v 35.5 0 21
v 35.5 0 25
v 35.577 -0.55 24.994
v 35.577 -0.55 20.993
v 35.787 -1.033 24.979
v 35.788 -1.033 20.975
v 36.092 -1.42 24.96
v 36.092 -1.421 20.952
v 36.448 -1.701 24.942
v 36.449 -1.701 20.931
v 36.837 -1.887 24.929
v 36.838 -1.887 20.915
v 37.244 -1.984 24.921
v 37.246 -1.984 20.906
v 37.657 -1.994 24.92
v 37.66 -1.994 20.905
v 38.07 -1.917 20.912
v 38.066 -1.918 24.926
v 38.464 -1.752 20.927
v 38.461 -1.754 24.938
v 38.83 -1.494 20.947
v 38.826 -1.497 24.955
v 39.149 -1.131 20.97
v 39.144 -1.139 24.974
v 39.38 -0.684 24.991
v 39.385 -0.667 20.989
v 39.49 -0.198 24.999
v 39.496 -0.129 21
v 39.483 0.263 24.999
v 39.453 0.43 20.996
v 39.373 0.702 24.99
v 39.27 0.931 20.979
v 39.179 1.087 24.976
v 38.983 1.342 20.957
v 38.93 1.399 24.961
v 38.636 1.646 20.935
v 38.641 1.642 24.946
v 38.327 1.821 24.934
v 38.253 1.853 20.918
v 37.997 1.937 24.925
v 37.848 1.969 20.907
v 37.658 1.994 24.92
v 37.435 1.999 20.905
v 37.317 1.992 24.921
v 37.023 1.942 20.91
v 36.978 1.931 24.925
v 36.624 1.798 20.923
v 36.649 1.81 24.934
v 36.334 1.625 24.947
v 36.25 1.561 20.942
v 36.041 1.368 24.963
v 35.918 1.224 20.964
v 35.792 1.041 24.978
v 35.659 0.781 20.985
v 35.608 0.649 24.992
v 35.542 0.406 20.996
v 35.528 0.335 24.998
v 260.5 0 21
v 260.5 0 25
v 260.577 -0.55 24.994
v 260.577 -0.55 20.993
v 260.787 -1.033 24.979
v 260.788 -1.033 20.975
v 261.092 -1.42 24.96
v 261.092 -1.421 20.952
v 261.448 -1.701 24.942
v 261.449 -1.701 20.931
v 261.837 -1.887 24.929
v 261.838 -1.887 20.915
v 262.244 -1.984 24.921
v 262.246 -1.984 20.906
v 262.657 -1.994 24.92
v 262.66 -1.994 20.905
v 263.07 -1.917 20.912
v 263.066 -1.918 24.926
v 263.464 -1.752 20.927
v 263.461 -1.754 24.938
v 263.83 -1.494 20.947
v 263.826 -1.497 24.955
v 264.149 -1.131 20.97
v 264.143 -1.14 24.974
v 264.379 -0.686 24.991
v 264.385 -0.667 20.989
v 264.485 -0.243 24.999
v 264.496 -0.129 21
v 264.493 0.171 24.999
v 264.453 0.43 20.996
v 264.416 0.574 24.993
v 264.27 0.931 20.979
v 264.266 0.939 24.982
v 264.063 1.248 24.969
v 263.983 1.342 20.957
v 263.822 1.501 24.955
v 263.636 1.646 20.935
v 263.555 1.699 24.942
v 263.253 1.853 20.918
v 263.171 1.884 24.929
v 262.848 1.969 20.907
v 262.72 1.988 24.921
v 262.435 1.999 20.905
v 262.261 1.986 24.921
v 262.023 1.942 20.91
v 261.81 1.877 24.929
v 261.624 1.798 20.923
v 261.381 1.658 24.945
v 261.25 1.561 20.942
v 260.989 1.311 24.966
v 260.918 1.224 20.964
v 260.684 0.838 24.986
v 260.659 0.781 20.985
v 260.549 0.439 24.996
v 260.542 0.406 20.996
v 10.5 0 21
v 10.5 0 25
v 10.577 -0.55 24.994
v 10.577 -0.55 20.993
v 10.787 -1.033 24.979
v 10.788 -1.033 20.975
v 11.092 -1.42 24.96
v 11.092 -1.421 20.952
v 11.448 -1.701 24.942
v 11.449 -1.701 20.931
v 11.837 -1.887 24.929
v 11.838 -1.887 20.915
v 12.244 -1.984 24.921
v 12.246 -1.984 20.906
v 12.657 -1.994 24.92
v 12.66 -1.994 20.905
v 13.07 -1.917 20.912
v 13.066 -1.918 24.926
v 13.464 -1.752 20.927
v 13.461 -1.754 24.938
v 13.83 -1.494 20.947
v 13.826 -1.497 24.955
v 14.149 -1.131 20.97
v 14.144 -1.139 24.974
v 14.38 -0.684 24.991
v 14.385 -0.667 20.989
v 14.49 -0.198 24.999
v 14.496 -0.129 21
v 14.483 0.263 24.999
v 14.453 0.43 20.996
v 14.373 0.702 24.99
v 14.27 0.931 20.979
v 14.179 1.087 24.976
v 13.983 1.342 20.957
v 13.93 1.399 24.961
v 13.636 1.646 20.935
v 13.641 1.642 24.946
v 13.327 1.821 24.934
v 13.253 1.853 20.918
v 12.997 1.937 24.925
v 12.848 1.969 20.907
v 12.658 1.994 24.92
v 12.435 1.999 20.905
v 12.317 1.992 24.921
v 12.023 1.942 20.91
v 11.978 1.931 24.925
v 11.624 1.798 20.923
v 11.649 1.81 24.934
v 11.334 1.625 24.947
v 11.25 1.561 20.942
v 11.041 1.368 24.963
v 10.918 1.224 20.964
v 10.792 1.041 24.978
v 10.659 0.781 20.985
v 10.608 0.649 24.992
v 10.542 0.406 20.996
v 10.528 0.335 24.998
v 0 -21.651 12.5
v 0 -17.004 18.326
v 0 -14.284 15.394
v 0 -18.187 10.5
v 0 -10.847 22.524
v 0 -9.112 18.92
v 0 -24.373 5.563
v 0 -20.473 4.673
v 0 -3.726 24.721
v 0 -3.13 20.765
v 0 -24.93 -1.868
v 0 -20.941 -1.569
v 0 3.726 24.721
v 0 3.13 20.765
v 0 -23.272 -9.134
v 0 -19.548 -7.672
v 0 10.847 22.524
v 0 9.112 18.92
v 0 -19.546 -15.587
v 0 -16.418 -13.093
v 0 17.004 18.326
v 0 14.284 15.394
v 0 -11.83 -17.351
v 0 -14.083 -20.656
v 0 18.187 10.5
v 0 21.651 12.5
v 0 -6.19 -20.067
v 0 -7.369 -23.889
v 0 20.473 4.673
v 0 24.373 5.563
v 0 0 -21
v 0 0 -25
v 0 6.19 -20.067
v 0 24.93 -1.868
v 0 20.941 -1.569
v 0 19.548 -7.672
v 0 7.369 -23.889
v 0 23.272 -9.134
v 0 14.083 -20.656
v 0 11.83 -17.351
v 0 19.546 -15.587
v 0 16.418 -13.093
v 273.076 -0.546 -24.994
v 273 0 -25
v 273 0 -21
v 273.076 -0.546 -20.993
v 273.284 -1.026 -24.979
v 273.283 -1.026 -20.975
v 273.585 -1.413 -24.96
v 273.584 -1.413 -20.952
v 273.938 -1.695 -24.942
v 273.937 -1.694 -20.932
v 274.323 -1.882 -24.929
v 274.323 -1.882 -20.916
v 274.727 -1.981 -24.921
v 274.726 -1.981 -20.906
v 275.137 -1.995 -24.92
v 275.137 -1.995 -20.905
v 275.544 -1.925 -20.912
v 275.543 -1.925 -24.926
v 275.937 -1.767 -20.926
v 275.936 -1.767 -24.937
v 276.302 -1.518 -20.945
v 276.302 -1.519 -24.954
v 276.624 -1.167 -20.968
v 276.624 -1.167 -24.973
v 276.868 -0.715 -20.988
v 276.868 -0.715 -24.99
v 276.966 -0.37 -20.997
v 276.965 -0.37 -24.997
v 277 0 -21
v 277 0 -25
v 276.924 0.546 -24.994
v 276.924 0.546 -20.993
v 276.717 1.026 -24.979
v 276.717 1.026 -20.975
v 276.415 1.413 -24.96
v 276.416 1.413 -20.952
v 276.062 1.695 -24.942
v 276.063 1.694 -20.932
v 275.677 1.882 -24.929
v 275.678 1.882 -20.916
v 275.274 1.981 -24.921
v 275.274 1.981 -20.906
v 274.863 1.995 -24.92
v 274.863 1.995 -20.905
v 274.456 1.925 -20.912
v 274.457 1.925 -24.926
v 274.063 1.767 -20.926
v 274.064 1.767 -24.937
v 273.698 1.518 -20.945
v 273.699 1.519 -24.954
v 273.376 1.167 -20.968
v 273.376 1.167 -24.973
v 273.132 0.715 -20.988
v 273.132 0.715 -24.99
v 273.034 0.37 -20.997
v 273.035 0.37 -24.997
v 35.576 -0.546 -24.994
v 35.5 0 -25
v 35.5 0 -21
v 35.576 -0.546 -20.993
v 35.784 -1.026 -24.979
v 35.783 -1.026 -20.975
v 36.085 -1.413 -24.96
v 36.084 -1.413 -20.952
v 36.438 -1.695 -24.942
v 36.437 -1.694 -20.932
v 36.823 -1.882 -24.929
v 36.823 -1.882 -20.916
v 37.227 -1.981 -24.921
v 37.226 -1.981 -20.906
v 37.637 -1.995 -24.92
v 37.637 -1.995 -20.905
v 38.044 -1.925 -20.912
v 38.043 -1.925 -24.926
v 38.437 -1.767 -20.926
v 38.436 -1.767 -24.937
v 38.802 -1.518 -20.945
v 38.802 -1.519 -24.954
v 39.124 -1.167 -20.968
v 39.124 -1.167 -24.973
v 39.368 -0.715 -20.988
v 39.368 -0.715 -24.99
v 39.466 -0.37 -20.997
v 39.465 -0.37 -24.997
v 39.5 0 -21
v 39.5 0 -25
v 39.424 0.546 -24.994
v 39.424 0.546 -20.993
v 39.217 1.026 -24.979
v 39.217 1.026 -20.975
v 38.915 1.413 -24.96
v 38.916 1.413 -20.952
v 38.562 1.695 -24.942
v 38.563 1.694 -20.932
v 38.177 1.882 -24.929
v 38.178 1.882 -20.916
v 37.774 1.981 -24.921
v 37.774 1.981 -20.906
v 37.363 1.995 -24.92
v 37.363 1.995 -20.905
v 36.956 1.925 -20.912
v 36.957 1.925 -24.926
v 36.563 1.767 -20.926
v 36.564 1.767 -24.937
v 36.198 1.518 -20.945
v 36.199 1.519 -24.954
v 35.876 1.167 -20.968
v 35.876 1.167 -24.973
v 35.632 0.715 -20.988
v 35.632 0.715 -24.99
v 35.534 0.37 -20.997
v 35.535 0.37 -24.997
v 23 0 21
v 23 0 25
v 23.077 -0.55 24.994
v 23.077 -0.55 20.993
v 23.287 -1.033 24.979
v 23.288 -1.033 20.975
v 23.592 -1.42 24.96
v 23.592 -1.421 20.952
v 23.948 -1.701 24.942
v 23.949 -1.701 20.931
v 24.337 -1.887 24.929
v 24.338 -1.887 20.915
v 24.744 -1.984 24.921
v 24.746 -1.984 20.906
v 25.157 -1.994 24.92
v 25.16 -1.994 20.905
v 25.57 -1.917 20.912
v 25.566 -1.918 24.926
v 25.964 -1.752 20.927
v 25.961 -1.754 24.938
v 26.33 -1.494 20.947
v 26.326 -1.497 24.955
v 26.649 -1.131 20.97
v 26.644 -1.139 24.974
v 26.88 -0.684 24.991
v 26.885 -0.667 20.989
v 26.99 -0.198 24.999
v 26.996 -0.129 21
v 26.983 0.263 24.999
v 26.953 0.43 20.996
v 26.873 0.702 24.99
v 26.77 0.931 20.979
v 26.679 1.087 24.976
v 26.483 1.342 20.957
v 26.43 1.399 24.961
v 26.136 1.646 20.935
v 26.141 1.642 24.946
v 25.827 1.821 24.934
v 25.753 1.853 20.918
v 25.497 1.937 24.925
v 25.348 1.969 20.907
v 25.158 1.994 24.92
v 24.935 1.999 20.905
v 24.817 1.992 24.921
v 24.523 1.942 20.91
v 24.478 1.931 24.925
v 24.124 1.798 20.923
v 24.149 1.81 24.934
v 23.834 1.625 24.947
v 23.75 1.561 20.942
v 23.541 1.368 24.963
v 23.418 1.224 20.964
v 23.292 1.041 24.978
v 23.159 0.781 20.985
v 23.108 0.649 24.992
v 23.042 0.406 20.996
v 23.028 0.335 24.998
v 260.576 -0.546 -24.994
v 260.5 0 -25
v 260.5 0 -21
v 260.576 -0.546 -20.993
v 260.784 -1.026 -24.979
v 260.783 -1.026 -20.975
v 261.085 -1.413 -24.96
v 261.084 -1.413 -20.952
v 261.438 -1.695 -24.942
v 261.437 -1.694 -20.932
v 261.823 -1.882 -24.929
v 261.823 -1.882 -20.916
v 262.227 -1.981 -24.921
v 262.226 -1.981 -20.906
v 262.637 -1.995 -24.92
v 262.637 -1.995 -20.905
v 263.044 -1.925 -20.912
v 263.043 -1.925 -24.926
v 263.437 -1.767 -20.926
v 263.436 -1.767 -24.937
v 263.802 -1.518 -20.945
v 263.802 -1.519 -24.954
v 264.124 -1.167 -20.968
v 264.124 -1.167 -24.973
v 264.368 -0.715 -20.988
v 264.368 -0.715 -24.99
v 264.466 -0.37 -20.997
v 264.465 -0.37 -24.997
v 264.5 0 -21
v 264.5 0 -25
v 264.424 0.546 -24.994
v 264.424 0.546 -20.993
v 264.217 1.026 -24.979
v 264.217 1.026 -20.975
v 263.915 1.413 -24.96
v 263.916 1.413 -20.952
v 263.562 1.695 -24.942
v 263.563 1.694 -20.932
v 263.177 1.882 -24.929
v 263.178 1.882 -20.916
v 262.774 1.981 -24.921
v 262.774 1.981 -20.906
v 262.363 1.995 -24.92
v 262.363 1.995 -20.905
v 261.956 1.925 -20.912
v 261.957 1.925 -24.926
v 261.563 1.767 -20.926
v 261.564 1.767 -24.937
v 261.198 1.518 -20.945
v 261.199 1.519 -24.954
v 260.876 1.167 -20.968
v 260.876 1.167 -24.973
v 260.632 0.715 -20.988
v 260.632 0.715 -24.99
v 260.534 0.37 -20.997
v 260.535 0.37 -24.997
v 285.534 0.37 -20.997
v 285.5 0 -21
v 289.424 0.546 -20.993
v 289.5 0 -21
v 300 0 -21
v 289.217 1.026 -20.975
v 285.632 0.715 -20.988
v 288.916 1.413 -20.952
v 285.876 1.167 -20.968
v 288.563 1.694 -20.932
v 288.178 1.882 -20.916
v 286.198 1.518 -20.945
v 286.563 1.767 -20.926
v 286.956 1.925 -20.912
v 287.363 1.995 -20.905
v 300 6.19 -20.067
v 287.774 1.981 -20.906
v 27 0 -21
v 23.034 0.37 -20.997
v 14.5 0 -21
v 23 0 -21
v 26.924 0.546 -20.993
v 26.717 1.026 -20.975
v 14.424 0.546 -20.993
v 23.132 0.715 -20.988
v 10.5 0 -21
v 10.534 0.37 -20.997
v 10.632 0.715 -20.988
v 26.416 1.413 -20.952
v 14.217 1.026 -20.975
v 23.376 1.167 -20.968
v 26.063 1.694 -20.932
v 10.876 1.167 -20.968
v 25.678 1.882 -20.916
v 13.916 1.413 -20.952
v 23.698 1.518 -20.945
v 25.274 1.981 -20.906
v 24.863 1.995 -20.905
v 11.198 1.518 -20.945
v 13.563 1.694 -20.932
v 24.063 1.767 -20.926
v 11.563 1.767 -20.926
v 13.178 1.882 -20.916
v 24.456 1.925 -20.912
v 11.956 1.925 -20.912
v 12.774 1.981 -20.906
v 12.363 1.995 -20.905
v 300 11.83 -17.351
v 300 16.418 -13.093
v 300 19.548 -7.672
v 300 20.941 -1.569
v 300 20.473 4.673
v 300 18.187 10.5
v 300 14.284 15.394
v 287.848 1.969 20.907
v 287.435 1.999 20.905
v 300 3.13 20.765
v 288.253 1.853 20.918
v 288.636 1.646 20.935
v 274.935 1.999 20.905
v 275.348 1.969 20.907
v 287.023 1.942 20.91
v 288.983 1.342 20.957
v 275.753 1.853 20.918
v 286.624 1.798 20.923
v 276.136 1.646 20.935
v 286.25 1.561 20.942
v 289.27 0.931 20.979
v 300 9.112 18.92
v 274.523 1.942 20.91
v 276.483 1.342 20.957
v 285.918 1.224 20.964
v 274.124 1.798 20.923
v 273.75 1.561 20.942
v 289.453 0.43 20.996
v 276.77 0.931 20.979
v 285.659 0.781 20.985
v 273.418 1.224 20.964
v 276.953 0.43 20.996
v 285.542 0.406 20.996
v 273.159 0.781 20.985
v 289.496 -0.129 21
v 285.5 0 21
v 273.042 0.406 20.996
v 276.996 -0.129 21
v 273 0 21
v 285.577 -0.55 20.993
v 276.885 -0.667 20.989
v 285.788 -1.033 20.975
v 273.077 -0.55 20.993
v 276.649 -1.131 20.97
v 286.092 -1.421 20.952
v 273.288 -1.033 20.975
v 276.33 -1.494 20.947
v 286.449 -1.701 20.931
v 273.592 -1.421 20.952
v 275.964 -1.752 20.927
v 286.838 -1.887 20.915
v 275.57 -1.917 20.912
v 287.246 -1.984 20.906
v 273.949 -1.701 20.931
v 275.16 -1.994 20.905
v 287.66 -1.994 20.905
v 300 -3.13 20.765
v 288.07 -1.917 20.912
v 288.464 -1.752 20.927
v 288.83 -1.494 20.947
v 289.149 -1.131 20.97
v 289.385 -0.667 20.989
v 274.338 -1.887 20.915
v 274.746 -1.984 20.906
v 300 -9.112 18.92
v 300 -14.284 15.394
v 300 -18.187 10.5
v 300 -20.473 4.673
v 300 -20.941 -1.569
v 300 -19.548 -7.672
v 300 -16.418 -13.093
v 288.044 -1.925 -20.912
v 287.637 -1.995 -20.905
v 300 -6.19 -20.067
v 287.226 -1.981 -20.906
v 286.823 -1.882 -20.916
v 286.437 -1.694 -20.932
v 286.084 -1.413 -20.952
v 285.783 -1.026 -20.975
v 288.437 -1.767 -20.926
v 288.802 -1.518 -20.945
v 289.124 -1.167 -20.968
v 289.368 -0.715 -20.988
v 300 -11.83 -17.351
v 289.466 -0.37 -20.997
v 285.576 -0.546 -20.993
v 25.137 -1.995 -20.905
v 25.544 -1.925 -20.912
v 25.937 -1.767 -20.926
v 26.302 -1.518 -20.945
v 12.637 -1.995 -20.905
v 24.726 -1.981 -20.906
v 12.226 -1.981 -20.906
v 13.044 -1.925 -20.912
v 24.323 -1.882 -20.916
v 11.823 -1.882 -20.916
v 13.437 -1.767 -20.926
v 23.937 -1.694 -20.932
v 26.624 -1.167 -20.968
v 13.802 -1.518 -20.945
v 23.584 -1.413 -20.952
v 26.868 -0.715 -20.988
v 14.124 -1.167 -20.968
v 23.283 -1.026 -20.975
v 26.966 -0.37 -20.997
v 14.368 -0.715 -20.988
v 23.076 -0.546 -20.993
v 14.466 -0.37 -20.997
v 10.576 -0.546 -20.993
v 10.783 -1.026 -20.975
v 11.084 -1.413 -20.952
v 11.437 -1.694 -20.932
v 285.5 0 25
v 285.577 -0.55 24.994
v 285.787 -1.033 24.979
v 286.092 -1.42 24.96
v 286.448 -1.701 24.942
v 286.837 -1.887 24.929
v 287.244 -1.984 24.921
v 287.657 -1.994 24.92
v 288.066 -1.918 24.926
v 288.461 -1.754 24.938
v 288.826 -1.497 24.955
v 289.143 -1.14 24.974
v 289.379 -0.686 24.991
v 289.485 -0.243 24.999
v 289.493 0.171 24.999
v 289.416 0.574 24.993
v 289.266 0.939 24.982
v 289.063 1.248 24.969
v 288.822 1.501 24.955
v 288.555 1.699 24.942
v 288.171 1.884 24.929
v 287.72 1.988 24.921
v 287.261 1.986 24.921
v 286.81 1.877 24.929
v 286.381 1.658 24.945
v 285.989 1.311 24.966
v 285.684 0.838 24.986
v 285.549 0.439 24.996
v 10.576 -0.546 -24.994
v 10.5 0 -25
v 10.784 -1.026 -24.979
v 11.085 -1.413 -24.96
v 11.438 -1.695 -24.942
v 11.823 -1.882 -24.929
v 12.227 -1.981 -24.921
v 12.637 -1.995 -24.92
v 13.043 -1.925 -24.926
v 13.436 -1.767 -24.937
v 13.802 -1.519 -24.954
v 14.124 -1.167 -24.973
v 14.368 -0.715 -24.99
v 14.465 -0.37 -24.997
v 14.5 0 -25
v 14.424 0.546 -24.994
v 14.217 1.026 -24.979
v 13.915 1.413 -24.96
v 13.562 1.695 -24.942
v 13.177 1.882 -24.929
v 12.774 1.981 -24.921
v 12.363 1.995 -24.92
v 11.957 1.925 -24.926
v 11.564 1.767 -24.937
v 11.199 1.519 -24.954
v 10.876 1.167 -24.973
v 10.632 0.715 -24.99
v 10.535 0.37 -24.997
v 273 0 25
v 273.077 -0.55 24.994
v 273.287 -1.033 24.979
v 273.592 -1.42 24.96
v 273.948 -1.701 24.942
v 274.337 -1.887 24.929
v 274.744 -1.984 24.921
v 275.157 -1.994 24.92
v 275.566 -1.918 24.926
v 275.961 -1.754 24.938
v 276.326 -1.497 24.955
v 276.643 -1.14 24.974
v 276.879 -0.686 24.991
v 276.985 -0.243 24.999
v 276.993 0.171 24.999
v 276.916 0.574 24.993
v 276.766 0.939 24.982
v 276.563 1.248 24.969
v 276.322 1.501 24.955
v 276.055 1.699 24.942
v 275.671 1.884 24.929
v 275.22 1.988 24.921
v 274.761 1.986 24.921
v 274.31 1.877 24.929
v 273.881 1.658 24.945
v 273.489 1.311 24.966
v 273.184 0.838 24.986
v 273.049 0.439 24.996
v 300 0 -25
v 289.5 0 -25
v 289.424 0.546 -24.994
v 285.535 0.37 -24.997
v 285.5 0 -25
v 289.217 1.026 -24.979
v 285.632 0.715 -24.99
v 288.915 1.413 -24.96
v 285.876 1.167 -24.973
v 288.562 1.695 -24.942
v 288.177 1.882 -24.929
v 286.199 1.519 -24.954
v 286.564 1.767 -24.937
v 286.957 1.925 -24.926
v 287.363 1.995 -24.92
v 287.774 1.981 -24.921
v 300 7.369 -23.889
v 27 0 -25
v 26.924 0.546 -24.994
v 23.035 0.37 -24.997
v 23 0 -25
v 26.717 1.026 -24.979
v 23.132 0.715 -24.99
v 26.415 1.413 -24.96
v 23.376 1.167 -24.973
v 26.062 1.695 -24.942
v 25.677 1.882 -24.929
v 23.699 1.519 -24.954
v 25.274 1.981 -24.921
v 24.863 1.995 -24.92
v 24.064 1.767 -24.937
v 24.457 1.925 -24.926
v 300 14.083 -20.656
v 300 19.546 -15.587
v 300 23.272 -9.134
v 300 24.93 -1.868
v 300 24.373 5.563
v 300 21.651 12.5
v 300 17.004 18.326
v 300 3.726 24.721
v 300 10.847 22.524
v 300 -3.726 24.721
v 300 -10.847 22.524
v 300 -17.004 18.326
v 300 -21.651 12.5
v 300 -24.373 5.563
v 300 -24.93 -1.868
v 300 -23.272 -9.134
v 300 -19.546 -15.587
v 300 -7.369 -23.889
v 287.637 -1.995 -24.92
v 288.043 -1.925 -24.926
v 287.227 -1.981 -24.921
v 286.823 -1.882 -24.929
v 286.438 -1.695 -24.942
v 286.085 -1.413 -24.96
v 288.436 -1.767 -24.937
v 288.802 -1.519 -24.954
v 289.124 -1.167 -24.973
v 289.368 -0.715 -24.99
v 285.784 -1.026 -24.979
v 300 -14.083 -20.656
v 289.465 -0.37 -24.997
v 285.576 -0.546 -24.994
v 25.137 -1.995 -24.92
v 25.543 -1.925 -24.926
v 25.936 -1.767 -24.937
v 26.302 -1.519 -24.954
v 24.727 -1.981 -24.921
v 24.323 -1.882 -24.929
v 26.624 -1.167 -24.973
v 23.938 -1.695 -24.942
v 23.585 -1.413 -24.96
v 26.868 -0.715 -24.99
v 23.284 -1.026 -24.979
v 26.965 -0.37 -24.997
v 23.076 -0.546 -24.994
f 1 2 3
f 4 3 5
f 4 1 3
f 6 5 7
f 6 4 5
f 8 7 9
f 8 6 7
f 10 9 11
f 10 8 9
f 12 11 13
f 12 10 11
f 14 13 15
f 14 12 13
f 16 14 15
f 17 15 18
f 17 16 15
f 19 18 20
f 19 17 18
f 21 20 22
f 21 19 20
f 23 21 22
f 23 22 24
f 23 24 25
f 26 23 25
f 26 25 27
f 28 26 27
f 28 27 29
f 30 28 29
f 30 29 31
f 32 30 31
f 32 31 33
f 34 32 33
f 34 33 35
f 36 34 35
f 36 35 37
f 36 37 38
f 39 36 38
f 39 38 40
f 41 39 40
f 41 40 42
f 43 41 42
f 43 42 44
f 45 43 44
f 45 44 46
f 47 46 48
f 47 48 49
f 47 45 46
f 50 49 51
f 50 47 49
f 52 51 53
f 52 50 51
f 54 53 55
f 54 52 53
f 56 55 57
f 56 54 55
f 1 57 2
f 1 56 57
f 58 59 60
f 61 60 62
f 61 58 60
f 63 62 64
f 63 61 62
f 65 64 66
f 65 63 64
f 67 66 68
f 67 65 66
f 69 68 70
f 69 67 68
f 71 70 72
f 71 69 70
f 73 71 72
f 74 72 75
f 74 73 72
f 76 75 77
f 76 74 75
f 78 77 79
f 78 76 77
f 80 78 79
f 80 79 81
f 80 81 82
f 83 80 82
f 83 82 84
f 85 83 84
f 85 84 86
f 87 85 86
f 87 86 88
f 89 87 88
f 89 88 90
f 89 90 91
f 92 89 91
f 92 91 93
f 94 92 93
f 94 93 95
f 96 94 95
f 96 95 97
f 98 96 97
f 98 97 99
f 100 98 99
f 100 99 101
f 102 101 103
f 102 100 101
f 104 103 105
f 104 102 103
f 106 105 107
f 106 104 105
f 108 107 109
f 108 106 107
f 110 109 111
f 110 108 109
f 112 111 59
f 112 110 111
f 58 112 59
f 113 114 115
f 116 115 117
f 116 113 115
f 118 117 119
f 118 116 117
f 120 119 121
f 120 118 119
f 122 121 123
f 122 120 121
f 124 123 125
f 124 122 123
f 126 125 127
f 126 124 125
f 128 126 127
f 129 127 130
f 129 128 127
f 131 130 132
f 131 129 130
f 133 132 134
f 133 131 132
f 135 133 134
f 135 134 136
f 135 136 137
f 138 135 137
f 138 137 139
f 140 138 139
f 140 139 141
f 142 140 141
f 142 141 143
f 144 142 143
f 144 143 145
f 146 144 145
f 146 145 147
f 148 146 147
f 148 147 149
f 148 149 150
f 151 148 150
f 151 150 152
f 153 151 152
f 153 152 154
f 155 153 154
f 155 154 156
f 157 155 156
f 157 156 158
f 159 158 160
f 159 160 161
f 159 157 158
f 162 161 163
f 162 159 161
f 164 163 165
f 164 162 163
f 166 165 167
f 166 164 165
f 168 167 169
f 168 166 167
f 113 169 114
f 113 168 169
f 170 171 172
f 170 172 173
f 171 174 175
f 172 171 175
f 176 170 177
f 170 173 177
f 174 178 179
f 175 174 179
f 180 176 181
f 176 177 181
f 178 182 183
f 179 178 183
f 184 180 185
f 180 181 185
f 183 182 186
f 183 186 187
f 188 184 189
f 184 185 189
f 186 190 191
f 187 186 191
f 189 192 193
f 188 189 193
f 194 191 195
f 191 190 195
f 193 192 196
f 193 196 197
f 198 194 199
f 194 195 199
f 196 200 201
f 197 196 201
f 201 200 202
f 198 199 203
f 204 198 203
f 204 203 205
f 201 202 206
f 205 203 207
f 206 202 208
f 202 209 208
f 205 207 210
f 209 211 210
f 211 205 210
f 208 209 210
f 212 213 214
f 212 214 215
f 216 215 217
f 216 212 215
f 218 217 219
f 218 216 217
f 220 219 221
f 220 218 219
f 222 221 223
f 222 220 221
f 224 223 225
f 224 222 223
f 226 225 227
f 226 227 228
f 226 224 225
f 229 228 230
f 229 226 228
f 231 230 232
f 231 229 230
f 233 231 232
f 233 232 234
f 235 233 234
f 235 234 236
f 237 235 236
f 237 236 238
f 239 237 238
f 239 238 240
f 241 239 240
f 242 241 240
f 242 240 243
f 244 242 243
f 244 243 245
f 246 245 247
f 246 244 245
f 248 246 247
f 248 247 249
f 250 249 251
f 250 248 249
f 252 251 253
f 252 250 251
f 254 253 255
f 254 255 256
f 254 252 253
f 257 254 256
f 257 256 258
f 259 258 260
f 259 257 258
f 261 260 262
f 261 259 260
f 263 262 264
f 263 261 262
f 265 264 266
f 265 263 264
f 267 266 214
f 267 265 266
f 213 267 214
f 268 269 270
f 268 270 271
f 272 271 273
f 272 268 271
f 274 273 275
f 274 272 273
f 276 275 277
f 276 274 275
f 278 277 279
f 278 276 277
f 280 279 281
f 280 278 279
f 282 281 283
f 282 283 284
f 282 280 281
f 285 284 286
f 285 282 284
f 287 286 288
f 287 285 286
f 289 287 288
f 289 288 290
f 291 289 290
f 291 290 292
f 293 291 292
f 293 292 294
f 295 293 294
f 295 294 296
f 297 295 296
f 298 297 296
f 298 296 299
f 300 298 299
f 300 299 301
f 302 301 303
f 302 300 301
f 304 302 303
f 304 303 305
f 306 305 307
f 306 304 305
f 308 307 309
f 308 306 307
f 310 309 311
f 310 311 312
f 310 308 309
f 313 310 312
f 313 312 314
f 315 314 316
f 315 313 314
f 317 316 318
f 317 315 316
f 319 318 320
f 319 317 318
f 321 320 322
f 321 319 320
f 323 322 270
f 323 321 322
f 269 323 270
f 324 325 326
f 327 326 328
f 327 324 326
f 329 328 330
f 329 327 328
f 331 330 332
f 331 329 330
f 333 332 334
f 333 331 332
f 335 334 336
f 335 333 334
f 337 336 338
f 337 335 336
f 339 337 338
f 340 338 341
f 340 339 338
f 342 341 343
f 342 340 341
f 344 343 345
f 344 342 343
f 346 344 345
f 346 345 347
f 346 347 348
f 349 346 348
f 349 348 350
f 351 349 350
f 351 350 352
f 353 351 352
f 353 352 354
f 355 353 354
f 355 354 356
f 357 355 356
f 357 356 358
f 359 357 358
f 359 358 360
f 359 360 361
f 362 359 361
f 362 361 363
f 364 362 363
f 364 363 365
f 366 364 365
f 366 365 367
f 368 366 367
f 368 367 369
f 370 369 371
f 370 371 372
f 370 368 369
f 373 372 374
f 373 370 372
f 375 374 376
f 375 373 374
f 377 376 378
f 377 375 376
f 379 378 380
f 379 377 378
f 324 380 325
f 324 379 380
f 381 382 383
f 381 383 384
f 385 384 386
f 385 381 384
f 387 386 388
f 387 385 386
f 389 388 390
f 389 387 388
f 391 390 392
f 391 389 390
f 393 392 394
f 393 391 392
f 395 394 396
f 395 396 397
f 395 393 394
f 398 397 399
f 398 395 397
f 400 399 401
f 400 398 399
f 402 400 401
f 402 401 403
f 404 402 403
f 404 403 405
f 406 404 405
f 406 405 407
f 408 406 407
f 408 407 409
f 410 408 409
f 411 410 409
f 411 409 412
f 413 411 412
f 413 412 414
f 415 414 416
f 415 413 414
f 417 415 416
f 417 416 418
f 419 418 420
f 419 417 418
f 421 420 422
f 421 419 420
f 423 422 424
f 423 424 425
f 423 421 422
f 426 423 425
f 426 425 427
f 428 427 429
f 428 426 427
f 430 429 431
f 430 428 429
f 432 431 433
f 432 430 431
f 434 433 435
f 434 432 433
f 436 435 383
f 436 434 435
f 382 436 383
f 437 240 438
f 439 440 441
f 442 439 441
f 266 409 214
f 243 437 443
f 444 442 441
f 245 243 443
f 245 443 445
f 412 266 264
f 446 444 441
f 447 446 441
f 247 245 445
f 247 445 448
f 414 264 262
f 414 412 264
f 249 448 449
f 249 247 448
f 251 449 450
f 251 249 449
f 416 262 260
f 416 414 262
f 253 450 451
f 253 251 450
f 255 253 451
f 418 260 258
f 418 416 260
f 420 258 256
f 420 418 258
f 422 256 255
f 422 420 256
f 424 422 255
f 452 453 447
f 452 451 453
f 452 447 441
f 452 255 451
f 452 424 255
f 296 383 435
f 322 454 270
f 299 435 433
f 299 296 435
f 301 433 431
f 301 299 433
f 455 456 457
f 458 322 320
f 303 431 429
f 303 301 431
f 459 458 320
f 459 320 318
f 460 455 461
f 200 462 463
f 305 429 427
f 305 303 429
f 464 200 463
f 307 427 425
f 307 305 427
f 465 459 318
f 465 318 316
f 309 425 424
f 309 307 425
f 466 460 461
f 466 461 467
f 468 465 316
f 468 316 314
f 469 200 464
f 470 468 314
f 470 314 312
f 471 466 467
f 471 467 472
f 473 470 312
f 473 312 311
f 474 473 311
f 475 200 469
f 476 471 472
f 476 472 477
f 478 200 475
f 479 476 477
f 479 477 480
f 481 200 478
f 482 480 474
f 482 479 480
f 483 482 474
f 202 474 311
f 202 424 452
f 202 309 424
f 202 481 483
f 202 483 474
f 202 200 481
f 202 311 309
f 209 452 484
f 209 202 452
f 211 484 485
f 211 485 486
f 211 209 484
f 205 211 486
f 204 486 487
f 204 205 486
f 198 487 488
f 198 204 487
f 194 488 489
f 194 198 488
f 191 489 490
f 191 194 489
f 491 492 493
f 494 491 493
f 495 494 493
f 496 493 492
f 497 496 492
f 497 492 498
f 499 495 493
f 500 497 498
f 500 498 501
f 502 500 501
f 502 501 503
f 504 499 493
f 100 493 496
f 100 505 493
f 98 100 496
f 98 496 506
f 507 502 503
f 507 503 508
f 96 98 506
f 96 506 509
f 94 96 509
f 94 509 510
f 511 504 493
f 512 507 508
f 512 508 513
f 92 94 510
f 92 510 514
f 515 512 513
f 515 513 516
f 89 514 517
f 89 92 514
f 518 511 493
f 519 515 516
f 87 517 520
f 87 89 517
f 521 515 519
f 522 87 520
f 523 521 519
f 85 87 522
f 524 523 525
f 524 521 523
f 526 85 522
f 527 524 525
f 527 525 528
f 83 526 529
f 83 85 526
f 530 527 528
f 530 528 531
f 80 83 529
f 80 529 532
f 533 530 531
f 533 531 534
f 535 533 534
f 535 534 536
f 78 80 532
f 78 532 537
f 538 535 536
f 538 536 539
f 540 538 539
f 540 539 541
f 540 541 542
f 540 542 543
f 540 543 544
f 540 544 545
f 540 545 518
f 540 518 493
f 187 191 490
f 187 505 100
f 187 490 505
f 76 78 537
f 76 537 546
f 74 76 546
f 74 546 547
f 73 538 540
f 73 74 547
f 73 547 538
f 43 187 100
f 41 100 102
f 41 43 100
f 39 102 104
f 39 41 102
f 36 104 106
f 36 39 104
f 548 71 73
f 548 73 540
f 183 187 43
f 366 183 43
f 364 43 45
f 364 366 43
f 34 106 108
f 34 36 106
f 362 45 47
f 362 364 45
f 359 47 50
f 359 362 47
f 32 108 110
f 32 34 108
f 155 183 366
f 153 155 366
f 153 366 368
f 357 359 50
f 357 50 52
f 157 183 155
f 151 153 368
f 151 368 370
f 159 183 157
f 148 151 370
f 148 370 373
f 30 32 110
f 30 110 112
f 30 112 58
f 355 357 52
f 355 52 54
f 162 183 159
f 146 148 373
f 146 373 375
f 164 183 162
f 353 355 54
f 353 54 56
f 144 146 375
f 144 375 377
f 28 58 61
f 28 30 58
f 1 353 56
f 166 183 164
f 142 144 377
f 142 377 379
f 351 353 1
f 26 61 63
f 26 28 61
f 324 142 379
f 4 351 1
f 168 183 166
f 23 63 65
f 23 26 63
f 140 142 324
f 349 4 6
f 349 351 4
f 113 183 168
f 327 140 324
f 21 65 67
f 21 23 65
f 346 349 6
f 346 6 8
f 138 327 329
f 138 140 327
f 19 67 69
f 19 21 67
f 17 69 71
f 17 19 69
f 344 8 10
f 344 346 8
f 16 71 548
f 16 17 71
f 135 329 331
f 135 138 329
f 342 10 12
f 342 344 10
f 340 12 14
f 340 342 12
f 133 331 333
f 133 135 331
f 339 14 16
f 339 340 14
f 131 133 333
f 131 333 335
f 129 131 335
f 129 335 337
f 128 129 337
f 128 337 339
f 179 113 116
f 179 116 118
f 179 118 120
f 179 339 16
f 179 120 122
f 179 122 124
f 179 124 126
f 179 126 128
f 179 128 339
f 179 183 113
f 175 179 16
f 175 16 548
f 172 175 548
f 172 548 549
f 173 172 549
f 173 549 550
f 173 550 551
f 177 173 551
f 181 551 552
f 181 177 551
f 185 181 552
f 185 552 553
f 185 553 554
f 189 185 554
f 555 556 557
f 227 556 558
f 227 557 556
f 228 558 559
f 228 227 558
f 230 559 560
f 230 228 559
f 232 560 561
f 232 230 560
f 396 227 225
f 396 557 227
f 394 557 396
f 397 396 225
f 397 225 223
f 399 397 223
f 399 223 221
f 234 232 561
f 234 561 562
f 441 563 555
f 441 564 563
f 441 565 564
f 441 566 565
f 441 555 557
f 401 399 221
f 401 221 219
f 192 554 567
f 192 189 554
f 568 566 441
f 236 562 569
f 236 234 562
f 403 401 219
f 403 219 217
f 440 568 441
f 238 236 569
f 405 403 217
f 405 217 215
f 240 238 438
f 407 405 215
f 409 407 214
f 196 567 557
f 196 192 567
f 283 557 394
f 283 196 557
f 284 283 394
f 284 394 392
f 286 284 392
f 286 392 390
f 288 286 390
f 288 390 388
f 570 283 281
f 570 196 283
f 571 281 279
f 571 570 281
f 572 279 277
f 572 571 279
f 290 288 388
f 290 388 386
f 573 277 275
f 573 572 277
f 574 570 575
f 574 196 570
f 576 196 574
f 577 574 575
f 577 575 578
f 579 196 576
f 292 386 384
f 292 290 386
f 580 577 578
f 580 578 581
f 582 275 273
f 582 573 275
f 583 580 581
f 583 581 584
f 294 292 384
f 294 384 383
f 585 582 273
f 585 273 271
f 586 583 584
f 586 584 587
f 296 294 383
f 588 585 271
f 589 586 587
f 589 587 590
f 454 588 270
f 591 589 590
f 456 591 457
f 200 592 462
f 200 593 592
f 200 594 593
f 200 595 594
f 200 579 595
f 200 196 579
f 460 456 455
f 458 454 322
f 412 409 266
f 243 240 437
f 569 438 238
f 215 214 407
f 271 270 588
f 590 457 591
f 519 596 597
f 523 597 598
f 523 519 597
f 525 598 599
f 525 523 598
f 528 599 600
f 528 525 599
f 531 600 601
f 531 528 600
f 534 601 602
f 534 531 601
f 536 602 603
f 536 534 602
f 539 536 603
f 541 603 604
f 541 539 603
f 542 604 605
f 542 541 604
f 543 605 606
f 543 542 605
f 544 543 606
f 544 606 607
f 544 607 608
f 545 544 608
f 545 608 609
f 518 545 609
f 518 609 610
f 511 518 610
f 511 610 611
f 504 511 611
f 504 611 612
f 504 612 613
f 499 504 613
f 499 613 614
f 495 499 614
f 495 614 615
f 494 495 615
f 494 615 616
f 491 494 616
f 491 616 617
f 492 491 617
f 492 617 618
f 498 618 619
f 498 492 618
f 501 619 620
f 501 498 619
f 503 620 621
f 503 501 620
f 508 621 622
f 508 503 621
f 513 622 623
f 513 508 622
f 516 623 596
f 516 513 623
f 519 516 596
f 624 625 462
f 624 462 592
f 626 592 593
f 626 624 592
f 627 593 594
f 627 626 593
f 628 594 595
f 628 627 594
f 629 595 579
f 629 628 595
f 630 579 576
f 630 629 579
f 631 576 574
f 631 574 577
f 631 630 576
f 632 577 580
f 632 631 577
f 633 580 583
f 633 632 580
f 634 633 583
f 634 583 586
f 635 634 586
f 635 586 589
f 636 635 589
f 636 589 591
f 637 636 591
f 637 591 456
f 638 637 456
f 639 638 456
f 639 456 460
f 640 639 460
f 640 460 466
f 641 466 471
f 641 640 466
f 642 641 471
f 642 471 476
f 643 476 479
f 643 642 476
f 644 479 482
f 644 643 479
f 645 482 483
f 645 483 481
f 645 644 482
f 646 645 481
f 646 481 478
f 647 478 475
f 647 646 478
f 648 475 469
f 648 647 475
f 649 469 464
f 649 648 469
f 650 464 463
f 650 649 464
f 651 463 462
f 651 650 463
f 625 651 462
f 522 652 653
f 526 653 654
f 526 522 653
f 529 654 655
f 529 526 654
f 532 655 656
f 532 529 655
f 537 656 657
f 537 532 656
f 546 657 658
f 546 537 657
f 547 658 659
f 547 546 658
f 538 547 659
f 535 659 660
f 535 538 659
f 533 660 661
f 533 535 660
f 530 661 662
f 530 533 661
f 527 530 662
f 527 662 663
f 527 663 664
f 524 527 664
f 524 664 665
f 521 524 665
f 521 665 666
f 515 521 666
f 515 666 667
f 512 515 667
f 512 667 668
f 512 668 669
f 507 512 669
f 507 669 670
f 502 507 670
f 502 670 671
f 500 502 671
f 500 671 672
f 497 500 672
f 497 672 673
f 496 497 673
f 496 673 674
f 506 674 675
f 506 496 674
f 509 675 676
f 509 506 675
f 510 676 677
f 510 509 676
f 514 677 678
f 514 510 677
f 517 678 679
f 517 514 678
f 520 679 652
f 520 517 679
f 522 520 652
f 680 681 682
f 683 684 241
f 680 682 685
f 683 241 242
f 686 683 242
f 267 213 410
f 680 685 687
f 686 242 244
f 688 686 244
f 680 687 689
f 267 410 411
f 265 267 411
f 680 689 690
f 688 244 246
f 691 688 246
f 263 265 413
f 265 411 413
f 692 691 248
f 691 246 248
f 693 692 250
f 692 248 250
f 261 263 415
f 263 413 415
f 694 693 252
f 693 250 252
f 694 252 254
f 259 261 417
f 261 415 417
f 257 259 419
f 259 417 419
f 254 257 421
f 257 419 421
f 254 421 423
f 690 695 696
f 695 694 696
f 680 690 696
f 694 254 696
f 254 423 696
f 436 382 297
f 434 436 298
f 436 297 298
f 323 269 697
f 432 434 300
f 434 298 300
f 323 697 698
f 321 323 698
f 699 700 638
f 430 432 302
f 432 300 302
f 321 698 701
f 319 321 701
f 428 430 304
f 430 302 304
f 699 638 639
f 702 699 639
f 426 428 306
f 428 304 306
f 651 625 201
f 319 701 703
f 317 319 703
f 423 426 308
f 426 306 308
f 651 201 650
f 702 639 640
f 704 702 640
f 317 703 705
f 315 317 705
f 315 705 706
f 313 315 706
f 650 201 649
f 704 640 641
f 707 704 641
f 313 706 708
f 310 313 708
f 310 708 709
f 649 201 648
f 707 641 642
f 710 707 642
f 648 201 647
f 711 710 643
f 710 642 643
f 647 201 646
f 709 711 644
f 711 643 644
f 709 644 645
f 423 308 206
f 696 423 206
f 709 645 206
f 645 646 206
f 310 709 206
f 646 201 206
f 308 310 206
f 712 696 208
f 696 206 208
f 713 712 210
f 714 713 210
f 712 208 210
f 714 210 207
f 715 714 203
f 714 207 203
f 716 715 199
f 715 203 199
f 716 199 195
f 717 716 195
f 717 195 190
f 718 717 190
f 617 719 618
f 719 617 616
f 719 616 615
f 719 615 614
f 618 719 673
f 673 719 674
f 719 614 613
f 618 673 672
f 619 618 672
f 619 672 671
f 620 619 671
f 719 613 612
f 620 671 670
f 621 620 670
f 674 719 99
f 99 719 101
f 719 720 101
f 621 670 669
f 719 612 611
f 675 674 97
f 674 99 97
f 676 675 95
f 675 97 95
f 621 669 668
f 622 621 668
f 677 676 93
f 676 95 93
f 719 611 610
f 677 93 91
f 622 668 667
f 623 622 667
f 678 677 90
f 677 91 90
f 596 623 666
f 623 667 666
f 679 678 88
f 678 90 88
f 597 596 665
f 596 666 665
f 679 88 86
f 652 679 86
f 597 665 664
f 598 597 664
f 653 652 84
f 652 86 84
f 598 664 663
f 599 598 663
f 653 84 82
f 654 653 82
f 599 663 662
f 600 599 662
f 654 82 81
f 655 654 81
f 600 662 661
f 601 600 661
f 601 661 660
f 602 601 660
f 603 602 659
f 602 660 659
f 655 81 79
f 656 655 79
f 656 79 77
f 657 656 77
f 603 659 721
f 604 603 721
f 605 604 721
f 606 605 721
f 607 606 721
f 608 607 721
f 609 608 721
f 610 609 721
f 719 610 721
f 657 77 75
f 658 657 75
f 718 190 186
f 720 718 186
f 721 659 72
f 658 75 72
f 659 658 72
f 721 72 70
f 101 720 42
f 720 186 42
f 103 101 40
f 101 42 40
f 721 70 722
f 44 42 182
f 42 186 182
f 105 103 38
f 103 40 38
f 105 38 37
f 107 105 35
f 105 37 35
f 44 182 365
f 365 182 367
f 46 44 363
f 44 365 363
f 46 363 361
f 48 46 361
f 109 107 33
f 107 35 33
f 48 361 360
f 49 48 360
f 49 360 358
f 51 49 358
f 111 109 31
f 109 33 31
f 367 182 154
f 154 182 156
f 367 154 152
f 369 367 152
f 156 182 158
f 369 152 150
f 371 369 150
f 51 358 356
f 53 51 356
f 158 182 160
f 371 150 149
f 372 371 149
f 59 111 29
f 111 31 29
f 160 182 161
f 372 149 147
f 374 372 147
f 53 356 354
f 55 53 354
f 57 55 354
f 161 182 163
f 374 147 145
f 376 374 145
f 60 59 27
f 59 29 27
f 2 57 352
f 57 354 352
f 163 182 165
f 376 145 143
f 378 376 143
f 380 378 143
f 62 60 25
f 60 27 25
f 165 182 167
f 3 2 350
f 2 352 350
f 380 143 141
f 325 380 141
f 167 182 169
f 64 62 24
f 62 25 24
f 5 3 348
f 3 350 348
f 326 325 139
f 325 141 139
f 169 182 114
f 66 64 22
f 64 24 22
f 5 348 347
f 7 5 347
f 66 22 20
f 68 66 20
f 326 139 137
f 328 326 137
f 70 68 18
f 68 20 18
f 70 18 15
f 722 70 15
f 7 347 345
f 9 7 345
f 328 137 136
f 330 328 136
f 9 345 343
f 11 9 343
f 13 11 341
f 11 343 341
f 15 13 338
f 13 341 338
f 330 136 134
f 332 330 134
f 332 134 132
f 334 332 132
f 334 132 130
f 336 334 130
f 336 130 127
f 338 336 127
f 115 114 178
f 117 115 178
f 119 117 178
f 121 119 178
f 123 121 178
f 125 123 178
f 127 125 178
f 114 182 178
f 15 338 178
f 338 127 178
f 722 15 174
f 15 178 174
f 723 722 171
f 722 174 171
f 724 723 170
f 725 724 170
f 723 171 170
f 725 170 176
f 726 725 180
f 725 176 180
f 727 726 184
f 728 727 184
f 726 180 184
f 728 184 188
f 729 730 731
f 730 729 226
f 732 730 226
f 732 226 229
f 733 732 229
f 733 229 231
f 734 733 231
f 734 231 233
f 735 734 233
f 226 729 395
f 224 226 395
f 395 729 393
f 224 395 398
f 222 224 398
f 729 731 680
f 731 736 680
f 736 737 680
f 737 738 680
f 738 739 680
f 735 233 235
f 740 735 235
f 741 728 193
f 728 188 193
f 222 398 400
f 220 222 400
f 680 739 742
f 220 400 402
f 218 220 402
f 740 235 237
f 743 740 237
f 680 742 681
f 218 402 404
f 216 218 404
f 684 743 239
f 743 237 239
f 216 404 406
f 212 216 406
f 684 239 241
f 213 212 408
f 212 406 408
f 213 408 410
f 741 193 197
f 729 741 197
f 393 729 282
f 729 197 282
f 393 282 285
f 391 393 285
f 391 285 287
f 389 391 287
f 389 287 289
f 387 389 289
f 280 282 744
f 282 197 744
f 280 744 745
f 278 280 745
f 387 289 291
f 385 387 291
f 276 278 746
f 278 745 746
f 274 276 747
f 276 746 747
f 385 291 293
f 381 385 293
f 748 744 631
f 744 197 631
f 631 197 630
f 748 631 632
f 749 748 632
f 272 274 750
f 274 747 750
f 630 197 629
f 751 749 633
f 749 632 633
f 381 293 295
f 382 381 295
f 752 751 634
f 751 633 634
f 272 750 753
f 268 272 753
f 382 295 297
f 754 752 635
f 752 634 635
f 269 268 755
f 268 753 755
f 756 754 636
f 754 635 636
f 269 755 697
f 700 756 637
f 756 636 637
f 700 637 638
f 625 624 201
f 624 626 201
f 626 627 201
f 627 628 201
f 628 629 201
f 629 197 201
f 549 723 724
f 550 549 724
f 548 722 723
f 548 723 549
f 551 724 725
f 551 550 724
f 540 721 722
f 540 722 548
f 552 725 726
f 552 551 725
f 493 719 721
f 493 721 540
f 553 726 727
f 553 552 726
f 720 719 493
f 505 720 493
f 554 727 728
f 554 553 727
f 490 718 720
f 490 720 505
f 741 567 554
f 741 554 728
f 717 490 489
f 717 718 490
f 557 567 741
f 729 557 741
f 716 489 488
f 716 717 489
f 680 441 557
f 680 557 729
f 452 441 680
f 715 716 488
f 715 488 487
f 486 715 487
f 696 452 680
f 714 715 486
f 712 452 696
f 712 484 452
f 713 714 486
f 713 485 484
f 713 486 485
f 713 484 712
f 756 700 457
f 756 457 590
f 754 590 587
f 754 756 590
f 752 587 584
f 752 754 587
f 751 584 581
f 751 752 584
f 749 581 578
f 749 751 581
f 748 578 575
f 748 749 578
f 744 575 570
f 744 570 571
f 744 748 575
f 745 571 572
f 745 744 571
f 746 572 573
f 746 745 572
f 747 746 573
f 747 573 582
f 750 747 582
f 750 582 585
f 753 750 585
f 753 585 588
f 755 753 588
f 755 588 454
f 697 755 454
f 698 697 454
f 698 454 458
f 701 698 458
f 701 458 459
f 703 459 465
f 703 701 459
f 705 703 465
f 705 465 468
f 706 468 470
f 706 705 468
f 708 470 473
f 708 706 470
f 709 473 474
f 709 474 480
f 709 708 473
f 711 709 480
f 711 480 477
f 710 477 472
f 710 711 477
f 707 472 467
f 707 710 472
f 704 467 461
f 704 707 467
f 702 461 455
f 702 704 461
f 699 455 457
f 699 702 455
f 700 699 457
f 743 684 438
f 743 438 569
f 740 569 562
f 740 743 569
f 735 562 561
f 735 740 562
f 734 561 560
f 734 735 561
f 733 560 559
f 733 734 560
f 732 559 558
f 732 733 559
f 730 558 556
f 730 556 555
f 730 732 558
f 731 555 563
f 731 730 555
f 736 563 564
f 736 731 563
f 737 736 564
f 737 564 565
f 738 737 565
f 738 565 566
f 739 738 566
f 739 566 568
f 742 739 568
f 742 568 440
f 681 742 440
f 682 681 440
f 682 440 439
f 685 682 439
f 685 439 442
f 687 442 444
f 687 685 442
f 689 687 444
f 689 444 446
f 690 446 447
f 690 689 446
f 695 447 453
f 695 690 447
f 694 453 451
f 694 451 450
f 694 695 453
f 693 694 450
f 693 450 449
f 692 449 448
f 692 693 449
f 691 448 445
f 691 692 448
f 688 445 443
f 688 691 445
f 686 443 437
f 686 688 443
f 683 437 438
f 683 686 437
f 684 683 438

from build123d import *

# Parameters (mm, degrees)
SKETCH_2_R               = 25
SKETCH_2_R_2             = 21
EXTRUDE_2_DEPTH          = 300
CUT_EXTRUDE_2_DEPTH      = 10
CUT_EXTRUDE_2_DEPTH_BACK = 306.163890393
SKETCH_4_R               = 2


with BuildPart() as part:
    # Эскиз2 → Бобышка-Вытянуть2 (new body)
    with BuildSketch(Plane(origin=(0, 0, 0), x_dir=(0, 0, -1), z_dir=(1, 0, 0))):
        Circle(SKETCH_2_R)
        Circle(SKETCH_2_R_2, mode=Mode.SUBTRACT)
    extrude(amount=EXTRUDE_2_DEPTH)

    # Эскиз4 → Вырез-Вытянуть2 (cut, two sides: drawn at the far end of the back side and taken through both)
    with BuildSketch(Plane.XY.offset(25).offset(-CUT_EXTRUDE_2_DEPTH_BACK)):
        with Locations((12.5, 0)):
            Circle(SKETCH_4_R)
        with Locations((287.5, 0)):
            Circle(SKETCH_4_R)
        with Locations((25, 0)):
            Circle(SKETCH_4_R)
        with Locations((37.5, 0)):
            Circle(SKETCH_4_R)
        with Locations((275, 0)):
            Circle(SKETCH_4_R)
        with Locations((262.5, 0)):
            Circle(SKETCH_4_R)
    extrude(amount=CUT_EXTRUDE_2_DEPTH + CUT_EXTRUDE_2_DEPTH_BACK, mode=Mode.SUBTRACT)


solid = part.part
